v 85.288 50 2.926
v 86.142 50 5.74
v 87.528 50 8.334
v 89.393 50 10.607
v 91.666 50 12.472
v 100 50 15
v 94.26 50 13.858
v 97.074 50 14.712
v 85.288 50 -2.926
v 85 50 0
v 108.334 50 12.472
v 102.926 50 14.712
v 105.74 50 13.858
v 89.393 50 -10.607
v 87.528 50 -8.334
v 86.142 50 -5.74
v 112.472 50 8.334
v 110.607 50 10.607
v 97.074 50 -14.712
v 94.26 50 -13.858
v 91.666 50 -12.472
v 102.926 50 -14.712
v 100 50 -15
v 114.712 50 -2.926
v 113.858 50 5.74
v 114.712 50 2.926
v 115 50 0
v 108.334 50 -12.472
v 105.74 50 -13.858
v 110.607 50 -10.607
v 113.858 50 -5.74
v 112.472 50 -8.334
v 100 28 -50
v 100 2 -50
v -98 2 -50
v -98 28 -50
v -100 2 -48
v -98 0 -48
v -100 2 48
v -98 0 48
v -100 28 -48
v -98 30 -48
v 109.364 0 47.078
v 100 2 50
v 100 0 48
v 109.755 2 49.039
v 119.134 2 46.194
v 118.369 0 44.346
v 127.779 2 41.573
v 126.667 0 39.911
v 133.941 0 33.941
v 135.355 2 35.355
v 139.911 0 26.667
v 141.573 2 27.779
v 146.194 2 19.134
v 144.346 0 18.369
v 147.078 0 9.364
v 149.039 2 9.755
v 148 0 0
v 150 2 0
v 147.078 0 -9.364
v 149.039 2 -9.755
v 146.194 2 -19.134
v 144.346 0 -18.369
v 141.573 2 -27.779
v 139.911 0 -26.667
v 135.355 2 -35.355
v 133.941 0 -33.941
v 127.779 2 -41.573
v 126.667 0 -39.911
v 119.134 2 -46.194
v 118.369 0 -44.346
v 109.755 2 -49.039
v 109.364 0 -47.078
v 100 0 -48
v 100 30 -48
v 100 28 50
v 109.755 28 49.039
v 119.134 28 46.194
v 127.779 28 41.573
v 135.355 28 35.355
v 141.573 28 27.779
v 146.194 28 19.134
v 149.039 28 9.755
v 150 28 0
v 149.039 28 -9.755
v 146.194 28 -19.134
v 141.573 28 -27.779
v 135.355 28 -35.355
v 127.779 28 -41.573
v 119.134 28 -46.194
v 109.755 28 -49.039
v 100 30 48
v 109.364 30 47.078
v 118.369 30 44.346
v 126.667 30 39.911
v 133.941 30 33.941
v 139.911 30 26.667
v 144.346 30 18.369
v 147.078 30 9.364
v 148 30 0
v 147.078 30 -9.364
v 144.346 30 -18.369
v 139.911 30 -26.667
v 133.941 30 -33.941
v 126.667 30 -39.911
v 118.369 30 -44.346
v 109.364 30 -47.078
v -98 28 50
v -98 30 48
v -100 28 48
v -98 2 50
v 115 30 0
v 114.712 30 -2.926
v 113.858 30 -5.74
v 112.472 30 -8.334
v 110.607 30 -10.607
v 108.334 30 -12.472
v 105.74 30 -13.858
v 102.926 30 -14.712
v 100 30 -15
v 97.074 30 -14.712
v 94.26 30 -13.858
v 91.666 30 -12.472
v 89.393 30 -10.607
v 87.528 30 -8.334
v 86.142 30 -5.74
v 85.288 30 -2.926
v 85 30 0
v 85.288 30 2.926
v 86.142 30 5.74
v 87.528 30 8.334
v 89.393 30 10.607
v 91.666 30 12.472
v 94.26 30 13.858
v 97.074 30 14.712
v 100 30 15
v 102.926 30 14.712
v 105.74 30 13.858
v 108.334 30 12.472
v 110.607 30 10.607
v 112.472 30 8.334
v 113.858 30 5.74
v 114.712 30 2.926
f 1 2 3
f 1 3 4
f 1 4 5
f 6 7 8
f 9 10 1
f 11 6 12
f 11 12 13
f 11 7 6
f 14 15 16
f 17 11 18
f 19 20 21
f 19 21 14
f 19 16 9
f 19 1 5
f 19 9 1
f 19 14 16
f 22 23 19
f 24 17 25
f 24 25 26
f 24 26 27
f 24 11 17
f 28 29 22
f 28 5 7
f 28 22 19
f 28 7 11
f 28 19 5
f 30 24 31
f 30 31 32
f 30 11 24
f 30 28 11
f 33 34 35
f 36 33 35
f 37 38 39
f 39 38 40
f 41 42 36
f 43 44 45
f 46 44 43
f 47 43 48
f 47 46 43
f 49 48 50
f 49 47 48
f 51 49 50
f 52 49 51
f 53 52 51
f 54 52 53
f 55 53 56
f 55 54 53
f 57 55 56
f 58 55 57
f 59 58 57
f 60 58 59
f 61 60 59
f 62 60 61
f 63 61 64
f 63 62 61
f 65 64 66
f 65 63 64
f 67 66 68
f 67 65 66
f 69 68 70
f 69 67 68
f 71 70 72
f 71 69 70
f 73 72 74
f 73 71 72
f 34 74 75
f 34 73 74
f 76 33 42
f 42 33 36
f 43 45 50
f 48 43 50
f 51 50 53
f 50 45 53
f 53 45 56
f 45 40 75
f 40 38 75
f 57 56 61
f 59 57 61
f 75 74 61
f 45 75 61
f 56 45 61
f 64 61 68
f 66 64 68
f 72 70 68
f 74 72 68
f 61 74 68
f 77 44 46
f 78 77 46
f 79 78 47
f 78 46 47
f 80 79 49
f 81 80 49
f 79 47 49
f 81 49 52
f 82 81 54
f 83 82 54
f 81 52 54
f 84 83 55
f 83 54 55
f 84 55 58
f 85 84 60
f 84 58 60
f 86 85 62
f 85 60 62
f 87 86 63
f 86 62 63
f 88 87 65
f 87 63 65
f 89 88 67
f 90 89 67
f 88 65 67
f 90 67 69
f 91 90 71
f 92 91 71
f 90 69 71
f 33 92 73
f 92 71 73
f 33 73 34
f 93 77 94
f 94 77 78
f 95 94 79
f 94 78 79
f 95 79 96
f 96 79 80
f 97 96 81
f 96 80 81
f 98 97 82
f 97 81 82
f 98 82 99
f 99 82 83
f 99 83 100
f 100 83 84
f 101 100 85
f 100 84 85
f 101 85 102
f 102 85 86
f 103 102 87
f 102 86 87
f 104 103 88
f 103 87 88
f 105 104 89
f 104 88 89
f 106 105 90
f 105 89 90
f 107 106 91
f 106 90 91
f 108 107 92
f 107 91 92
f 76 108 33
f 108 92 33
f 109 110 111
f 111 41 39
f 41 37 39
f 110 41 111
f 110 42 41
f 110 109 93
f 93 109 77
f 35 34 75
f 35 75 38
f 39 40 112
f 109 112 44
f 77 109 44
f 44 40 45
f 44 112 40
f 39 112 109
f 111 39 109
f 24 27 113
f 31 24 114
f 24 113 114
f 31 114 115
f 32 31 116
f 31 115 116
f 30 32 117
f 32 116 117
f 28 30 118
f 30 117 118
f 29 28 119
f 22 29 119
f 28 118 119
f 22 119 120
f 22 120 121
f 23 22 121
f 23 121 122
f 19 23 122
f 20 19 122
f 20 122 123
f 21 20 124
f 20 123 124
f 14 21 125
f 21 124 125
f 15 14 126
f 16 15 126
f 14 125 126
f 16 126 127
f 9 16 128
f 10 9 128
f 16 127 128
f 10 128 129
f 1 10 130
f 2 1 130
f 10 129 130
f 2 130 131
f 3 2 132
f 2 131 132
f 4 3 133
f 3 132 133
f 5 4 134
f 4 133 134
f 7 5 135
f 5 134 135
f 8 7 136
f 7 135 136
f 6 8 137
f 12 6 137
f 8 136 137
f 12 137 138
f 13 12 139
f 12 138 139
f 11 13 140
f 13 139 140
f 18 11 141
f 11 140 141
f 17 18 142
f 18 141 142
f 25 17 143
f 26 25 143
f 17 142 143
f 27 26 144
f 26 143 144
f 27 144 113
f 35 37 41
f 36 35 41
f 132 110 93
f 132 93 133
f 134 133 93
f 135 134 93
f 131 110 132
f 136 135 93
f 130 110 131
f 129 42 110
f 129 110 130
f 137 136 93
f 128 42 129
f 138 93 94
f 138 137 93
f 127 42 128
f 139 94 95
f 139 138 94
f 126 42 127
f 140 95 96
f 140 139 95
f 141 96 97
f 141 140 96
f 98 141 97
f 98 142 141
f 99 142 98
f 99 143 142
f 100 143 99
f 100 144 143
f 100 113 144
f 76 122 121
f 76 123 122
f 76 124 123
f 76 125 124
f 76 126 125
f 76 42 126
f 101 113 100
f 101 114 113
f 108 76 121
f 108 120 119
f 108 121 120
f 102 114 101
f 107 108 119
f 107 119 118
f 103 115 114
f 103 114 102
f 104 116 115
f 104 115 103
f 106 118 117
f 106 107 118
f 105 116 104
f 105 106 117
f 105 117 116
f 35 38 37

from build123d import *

# Parameters (mm, degrees)
BOSS_EXTRUDE1_DEPTH = 30
SKETCH2_R           = 15
BOSS_EXTRUDE2_DEPTH = 20
CHAMFER1_SIZE       = 2


with BuildPart() as part:
    # Sketch1 → Boss-Extrude1 (new body)
    with BuildSketch(Plane(origin=(0, 0, 0), x_dir=(1, 0, 0), z_dir=(0, 1, 0))):
        with BuildLine():
            Line((100, 50), (-100, 50))
            Line((-100, 50), (-100, -50))
            Line((-100, -50), (100, -50))
            ThreePointArc((100, -50), (150, 0), (100, 50))
        make_face()
    extrude(amount=BOSS_EXTRUDE1_DEPTH)

    # Sketch2 → Boss-Extrude2 (add)
    with BuildSketch(Plane(origin=(0, 30, 0), x_dir=(1, 0, 0), z_dir=(0, 1, 0))):
        with Locations((100, 0)):
            Circle(SKETCH2_R)
    extrude(amount=BOSS_EXTRUDE2_DEPTH)

    # Chamfer1
    chamfer1_edges = [part.edges().sort_by_distance(p)[0] for p in [
        (-100, 30, 0),
        (0, 30, 50),
        (150, 30, 0),
        (0, 0, 50),
        (-100, 0, 0),
        (0, 0, -50),
        (150, 0, 0),
        (-100, 15, 50),
        (-100, 15, -50),
        (0, 30, -50),
    ]]
    chamfer(chamfer1_edges, length=CHAMFER1_SIZE)


solid = part.part
